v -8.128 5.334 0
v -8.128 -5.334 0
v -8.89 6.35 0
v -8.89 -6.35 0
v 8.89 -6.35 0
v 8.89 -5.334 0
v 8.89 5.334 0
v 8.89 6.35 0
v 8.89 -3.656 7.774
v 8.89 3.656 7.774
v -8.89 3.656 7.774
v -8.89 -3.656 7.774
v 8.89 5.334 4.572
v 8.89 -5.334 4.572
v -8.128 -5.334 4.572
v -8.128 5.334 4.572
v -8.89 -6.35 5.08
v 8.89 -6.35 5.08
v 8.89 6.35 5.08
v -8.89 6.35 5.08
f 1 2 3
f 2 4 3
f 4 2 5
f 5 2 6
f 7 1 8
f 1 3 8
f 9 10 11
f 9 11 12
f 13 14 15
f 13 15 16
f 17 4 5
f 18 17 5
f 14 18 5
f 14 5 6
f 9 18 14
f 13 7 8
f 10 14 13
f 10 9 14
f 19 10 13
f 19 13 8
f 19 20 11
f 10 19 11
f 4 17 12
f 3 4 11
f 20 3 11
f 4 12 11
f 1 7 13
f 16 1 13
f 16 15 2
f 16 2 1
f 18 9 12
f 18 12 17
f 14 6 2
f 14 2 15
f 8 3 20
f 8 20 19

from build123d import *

# Parameters (mm, degrees)
F0_W     = 17.78
F0_H     = 12.7
F1_DEPTH = 5.08
F3_DEPTH = 17.78
F4_W     = 10.668
F4_H     = 4.572
F5_DEPTH = 17.018


with BuildPart() as f1:
    # F0 (on Top) → F1 (new body)
    with BuildSketch(Plane.XY):
        Rectangle(F0_W, F0_H)
    extrude(amount=F1_DEPTH)

    # F2 (on face) → F3 (join)
    with BuildSketch(Plane.YZ.offset(8.89)):
        Polygon((-3.655923, 7.774077), (-6.35, 5.08), (6.35, 5.08), (3.655923, 7.774077), (0, 7.774077), align=None)
    extrude(amount=-F3_DEPTH)

    # F4 (on face) → F5 (cut)
    with BuildSketch(Plane.YZ.offset(8.89)):
        with Locations((0, 2.286)):
            Rectangle(F4_W, F4_H)
    extrude(amount=-F5_DEPTH, mode=Mode.SUBTRACT)


solid = f1.part
